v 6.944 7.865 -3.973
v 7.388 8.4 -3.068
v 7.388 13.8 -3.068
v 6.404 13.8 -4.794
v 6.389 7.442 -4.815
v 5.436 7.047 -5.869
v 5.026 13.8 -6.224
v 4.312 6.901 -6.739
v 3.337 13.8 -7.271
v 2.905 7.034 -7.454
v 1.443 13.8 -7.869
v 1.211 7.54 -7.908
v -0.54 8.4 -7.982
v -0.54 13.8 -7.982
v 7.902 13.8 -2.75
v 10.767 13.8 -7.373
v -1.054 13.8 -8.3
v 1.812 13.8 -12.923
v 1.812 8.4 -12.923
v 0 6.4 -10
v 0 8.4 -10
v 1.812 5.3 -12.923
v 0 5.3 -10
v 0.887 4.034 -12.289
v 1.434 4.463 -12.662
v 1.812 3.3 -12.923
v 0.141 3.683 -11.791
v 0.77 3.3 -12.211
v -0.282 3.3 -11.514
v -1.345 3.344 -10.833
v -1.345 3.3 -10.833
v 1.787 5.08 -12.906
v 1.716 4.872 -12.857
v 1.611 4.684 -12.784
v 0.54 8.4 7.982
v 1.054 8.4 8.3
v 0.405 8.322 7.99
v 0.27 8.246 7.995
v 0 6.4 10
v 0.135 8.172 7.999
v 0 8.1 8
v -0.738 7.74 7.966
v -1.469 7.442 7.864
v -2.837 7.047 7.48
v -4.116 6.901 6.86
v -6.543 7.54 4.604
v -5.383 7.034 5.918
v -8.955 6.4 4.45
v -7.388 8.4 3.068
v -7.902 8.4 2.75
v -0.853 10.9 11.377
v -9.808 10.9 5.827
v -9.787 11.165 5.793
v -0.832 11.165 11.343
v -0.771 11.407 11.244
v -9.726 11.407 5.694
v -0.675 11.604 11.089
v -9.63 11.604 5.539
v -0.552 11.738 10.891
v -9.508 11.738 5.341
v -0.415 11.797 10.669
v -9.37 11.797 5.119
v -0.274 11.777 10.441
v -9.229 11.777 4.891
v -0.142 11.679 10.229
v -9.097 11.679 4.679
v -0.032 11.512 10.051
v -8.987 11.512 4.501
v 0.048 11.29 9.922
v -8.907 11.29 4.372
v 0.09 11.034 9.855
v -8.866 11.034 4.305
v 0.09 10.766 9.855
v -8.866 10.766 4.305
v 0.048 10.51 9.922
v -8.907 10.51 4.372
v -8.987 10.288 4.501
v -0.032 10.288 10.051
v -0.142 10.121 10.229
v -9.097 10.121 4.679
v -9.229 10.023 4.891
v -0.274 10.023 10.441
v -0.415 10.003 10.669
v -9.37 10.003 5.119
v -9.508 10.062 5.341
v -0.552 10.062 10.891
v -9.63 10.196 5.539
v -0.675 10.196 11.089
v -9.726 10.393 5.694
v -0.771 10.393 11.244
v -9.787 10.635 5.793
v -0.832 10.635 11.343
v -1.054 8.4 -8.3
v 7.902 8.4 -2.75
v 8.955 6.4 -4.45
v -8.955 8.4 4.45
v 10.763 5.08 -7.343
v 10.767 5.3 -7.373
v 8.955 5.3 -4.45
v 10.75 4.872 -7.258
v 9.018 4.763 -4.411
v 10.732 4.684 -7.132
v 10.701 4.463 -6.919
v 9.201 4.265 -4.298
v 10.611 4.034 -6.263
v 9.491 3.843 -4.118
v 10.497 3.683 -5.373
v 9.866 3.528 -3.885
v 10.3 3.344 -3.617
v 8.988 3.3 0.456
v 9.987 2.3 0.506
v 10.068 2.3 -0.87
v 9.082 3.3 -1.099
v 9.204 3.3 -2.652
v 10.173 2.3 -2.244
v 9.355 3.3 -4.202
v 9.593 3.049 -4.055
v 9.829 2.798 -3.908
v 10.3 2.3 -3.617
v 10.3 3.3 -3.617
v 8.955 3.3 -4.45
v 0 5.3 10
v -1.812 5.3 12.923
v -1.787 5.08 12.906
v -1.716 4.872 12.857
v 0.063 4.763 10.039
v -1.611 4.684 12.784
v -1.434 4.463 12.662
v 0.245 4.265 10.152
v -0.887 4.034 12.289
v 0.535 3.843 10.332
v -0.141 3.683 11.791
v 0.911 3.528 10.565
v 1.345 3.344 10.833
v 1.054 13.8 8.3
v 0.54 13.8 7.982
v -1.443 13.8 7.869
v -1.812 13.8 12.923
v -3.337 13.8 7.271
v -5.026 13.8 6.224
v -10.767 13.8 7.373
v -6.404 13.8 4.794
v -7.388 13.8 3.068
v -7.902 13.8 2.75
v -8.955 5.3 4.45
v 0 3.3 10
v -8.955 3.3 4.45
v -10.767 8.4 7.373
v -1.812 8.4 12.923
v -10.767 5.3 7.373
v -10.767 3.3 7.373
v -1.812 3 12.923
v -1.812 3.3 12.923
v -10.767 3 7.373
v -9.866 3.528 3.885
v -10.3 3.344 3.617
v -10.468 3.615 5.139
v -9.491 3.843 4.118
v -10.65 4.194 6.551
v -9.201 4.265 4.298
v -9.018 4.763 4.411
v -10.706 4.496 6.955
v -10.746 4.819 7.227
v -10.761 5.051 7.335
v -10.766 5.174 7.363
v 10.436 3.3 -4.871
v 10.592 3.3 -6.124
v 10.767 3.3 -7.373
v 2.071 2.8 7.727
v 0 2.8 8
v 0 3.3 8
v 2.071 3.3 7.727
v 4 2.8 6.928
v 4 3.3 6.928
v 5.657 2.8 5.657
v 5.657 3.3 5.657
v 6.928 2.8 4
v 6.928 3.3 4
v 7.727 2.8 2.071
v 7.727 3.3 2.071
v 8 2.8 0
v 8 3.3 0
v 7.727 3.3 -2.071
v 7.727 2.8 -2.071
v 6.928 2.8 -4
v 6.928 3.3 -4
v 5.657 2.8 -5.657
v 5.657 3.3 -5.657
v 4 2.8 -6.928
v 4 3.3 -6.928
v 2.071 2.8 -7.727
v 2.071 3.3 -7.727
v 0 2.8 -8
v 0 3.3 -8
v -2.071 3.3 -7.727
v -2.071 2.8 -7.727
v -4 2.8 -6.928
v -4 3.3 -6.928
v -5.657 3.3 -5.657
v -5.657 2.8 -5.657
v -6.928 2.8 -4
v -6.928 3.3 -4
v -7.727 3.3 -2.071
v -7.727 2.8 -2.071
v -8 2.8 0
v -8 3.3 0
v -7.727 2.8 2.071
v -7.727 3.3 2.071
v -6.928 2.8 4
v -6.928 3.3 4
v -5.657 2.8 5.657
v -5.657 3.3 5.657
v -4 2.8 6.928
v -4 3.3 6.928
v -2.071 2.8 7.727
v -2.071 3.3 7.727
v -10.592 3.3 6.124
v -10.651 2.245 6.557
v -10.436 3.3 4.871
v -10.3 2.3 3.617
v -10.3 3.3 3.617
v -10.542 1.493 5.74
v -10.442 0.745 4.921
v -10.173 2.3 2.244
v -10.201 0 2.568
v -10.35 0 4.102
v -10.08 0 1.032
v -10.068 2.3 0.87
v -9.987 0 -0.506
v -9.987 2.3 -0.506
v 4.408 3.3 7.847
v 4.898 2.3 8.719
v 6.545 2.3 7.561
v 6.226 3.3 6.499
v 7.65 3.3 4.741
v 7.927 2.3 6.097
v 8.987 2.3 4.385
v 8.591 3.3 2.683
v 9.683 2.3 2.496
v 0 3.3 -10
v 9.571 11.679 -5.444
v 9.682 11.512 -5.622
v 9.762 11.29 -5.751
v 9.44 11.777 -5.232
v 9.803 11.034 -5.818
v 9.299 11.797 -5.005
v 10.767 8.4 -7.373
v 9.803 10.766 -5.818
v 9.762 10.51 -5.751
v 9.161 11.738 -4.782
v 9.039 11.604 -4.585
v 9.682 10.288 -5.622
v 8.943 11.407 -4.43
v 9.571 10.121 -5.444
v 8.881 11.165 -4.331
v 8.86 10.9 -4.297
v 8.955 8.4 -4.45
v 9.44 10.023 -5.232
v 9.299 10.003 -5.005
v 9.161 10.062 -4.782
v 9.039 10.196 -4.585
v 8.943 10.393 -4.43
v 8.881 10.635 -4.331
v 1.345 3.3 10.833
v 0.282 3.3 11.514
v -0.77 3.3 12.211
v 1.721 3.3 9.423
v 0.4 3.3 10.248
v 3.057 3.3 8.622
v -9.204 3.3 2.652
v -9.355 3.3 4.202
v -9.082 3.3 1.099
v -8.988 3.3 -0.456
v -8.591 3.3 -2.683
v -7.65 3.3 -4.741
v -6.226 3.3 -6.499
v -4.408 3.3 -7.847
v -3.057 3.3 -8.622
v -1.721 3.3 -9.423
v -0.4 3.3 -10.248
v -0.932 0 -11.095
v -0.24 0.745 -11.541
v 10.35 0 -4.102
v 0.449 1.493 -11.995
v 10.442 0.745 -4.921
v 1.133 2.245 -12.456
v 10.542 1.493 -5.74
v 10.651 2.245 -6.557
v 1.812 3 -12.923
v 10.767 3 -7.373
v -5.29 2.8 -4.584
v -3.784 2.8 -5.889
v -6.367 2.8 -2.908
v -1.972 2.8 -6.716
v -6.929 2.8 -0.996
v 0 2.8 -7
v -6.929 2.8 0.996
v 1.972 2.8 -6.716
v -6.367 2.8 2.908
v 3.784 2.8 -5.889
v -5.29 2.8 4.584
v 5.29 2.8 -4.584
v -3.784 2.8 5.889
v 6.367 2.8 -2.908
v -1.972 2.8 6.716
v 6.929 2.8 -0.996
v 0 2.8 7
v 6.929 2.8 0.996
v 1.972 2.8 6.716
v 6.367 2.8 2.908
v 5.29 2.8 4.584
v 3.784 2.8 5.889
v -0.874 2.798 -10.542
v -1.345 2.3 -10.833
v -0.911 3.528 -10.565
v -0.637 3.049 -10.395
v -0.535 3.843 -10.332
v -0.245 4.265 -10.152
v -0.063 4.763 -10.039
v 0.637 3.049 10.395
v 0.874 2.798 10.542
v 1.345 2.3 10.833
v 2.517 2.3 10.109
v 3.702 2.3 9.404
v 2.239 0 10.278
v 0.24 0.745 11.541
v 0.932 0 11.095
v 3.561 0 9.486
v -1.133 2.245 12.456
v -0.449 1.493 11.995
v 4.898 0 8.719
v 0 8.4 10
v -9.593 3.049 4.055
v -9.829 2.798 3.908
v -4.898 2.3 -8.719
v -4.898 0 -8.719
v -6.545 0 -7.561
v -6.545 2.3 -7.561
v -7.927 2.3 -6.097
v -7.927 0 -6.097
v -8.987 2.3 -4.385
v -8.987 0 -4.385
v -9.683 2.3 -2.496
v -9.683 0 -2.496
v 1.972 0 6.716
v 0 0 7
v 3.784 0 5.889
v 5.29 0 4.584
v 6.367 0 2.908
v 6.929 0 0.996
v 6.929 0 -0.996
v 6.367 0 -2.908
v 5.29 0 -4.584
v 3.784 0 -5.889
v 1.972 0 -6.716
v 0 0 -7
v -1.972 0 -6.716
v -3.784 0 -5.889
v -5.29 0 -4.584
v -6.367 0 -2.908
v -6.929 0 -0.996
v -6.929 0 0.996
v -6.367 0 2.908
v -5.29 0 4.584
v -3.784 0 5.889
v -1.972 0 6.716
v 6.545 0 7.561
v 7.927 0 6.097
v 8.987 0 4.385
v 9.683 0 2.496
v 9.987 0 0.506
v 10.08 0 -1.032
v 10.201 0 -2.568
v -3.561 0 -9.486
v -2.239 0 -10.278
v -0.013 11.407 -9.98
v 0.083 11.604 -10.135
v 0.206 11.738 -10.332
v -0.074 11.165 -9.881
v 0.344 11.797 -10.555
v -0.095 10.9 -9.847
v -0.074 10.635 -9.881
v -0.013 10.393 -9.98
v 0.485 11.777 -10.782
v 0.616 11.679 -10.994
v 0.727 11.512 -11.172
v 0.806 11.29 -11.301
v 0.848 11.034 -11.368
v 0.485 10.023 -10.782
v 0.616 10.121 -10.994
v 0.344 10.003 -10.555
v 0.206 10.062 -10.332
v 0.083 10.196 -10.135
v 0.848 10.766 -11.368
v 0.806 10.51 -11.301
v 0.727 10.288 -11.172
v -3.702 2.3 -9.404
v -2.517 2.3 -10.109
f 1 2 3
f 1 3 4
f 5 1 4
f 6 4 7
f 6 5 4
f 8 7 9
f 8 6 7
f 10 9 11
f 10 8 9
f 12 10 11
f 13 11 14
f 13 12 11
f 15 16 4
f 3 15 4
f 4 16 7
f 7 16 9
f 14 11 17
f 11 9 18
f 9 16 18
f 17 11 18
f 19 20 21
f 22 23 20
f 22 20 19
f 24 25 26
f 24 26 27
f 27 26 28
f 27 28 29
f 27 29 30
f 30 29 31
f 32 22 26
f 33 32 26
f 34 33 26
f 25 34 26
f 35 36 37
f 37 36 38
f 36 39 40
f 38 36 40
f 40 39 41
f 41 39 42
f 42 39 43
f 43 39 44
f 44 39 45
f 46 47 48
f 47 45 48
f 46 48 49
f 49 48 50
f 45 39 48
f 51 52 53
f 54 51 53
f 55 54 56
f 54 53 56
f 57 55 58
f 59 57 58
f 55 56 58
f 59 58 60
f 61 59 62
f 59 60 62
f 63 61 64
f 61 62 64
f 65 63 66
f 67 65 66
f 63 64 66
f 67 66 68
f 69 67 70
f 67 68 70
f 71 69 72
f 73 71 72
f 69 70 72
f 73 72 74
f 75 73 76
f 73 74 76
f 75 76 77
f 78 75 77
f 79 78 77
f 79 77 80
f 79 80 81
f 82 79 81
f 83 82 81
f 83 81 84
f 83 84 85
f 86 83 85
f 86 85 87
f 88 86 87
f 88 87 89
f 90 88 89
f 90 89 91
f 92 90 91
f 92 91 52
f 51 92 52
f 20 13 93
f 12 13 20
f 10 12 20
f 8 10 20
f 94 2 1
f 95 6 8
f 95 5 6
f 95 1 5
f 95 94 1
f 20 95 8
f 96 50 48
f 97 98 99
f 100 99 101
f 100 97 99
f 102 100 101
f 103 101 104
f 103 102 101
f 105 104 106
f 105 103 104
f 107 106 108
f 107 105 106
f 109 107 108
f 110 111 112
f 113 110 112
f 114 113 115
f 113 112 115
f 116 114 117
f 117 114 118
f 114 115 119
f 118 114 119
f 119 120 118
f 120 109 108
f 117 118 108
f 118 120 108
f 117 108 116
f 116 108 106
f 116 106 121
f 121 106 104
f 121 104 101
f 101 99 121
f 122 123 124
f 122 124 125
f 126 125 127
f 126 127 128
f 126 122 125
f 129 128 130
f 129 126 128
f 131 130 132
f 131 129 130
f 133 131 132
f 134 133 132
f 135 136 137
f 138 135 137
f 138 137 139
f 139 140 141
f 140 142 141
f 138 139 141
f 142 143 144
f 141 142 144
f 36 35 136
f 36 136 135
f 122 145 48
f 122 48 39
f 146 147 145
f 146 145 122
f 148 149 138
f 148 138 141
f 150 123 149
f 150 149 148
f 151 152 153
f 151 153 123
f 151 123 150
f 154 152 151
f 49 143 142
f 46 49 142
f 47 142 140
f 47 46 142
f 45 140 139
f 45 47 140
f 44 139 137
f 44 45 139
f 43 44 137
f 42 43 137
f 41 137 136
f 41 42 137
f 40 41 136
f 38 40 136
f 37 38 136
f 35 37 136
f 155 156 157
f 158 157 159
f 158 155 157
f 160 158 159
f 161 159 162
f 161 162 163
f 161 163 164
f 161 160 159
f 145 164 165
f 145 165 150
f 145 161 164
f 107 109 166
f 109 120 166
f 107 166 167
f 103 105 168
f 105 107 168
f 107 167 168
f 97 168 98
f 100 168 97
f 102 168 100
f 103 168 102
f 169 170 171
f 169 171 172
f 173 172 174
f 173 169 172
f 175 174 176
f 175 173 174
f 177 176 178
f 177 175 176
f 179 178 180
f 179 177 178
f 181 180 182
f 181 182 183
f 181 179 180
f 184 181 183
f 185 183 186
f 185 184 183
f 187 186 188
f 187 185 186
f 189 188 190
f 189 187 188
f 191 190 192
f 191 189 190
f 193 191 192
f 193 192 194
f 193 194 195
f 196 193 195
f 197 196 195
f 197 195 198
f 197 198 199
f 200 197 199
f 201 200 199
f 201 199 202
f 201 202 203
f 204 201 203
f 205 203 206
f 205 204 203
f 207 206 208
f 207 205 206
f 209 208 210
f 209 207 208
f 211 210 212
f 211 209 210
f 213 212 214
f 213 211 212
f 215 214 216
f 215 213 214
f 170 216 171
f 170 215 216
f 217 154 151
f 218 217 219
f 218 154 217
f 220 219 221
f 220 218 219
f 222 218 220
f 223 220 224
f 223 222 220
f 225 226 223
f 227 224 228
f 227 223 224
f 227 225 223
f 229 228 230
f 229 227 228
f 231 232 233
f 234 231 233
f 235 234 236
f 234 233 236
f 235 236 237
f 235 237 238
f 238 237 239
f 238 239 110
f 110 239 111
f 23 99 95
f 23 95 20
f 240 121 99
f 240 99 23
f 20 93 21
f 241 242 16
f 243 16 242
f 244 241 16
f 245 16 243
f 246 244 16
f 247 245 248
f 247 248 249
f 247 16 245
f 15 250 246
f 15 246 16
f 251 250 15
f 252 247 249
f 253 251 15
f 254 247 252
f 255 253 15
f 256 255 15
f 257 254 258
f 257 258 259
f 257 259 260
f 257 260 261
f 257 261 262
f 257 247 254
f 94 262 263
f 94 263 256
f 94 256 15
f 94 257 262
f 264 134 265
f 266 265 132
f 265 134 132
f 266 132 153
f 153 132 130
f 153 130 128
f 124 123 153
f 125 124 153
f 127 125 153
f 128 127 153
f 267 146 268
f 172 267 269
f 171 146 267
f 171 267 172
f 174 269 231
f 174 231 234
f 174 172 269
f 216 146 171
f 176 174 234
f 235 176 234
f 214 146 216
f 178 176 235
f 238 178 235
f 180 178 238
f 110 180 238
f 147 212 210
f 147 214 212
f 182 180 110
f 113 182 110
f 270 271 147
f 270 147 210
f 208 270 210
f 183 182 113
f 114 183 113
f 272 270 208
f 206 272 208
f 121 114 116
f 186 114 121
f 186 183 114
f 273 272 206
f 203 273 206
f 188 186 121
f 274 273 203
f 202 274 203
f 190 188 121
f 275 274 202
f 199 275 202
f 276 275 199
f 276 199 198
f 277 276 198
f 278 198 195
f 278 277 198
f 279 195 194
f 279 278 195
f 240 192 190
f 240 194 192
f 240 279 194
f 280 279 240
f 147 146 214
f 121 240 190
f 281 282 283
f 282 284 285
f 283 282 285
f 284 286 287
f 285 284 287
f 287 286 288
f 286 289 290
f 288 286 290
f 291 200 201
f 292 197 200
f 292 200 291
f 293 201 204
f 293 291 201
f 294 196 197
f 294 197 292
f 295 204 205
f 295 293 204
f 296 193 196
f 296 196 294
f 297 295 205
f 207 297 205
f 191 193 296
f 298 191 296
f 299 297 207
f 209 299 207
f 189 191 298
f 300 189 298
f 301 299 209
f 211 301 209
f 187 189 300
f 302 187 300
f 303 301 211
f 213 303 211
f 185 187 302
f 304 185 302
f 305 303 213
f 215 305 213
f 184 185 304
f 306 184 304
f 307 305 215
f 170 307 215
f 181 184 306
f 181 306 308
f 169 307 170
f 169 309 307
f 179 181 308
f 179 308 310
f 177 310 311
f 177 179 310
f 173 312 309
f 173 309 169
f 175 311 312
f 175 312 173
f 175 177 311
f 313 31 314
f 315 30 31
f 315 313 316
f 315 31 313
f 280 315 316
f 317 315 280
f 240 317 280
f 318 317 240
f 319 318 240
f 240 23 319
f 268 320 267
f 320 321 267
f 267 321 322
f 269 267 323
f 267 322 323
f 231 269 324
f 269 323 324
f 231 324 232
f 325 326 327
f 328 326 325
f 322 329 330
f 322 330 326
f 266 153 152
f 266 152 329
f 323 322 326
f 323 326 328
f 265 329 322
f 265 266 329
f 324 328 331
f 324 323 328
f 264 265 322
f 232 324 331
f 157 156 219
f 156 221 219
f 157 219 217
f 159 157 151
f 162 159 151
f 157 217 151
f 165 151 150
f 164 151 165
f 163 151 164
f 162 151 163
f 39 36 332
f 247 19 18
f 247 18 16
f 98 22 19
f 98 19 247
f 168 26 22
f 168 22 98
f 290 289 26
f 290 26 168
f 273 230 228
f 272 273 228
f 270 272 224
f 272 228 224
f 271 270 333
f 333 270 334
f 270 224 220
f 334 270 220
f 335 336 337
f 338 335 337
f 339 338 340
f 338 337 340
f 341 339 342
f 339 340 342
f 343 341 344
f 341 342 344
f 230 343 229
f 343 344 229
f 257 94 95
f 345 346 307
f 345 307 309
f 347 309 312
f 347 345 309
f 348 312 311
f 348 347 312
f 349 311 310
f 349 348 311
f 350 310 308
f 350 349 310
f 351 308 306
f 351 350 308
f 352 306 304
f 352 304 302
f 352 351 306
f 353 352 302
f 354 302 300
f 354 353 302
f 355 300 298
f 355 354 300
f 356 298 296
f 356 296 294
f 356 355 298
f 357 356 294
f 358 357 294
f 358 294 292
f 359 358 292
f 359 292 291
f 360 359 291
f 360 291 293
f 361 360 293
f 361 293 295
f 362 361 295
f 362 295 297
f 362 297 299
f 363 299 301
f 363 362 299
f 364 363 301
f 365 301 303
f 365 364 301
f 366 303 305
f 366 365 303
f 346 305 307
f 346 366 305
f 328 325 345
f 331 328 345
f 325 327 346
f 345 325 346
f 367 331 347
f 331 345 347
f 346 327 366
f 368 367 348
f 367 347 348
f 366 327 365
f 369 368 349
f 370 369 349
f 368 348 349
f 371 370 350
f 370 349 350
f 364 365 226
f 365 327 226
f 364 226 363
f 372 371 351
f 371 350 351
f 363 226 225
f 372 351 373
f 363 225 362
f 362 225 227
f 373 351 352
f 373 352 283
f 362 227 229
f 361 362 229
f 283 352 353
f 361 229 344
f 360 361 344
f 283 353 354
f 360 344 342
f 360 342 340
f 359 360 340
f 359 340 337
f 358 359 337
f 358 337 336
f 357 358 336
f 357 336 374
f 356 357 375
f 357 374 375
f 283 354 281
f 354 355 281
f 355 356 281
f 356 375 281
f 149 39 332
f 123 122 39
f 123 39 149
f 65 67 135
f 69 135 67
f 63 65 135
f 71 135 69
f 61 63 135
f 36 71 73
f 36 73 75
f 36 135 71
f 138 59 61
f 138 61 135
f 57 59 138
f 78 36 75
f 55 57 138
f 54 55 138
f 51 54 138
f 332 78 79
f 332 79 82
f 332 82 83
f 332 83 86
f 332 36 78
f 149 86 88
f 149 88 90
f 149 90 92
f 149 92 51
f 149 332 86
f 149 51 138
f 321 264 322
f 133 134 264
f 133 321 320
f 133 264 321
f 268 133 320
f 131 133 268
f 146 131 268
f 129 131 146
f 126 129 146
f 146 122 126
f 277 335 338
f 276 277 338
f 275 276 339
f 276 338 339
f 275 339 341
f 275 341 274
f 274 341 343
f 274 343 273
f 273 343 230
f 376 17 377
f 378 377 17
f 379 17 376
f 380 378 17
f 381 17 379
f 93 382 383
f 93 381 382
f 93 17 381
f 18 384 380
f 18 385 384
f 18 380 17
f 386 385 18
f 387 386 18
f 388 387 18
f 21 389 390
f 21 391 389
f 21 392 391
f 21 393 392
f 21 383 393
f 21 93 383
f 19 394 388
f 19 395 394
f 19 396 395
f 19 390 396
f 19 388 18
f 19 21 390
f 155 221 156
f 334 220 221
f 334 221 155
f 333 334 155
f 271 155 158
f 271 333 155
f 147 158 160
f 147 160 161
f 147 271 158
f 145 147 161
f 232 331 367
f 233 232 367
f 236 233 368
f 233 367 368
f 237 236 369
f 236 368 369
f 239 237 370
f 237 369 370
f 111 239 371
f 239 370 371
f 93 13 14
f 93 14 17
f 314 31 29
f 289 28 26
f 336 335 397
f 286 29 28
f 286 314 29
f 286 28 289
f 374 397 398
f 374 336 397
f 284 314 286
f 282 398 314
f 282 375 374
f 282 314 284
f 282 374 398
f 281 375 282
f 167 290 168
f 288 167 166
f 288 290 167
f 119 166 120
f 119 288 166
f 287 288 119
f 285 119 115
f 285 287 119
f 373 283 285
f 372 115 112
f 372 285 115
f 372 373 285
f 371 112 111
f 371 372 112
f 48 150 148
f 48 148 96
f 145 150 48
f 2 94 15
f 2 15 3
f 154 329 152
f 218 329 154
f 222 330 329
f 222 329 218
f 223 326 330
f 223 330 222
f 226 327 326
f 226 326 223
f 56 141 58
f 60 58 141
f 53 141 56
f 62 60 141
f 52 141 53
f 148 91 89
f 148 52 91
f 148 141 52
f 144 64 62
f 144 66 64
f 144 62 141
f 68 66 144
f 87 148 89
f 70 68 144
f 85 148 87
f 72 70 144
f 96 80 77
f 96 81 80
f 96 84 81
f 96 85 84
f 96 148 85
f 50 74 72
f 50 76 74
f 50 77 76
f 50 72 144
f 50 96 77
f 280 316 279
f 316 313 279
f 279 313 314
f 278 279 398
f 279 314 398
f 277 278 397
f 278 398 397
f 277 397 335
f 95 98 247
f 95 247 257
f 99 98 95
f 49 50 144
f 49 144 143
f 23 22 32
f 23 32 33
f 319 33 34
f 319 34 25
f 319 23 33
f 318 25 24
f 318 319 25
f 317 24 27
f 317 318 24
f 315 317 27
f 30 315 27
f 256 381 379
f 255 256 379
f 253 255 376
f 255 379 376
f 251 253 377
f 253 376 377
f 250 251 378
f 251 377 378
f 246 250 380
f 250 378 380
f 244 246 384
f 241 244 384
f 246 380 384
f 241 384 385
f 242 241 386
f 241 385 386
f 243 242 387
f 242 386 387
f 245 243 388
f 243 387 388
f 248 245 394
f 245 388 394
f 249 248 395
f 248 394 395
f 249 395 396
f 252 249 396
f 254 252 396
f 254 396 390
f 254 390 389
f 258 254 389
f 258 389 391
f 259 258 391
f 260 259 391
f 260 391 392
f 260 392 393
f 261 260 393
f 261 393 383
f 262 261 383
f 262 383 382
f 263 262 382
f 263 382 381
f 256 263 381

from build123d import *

# Parameters (mm, degrees)
SKETCH_1_R          = 10
SKETCH_1_R_2        = 7
EXTRUDE_1_DEPTH     = 2.8
SKETCH_2_R          = 10
SKETCH_2_R_2        = 8
EXTRUDE_2_DEPTH     = 0.5
EXTRUDE_3_DEPTH     = 8.4
EXTRUDE_4_DEPTH     = 5.4
SKETCH_7_R          = 0.9
CUT_EXTRUDE_1_DEPTH = 26.870410541
CHAMFER_2_SIZE      = 2
EXTRUDE_5_REACH     = 23.757
FILLET_2_R          = 82.5
CHAMFER_4_SIZE      = 3
FILLET_3_R          = 2
CUT_EXTRUDE_START   = -7
SKETCH_9_R          = 8
CUT_EXTRUDE_2_DEPTH = 7
CHAMFER_5_SIZE      = 1


with BuildPart() as part:
    # 草图1 → 凸台-拉伸1 (new body)
    with BuildSketch(Plane(origin=(0, 0, 0), x_dir=(1, 0, 0), z_dir=(0, 1, 0))):
        with Locations(Location((0, 0, 0), (0, 0, 270))):
            Circle(SKETCH_1_R)
        with Locations(Location((0, 0, 0), (0, 0, 270))):
            Circle(SKETCH_1_R_2, mode=Mode.SUBTRACT)
    extrude(amount=EXTRUDE_1_DEPTH)

    # 草图2 → 凸台-拉伸2 (add)
    with BuildSketch(Plane(origin=(0, 2.8, 0), x_dir=(1, 0, 0), z_dir=(0, 1, 0))):
        with Locations(Location((0, 0, 0), (0, 0, 270))):
            Circle(SKETCH_2_R)
        with Locations(Location((0, 0, 0), (0, 0, 270))):
            Circle(SKETCH_2_R_2, mode=Mode.SUBTRACT)
    extrude(amount=EXTRUDE_2_DEPTH)

    # 草图3 → 凸台-拉伸3 (add)
    with BuildSketch(Plane.XZ):
        with BuildLine():
            ThreePointArc((0, 10), (-5.267826876, 8.5), (-8.95530569, 4.45))
            Line((-8.95530569, 4.45), (0, 10))
        make_face()
        with BuildLine():
            Line((8.95530569, -4.45), (0, -10))
            ThreePointArc((0, -10), (5.267826876, -8.5), (8.95530569, -4.45))
        make_face()
    extrude(amount=-EXTRUDE_3_DEPTH)

    # 草图5 → 凸台-拉伸4 (add)
    with BuildSketch(Plane(origin=(0, 8.4, 0), x_dir=(1, 0, 0), z_dir=(0, 1, 0))):
        Polygon((1.811722614, 12.923338709), (10.767028304, 7.373338709), (7.901740315, 2.75), (-1.053565375, 8.3), align=None)
        Polygon((-7.901740315, -2.75), (1.053565375, -8.3), (-1.811722614, -12.923338709), (-10.767028304, -7.373338709), align=None)
    extrude(amount=EXTRUDE_4_DEPTH)

    # 草图7 → 切除-拉伸1 (cut, through all)
    with BuildSketch(Plane(origin=(-4.477652845, 0, -2.775), x_dir=(-0.5267826876426366, 0, 0.8500000000000003), z_dir=(-0.8500000000000003, 0, -0.5267826876426366))):
        with Locations((9.219611005, 10.9)):
            Circle(SKETCH_7_R)
        with Locations((-9.219611005, 10.9)):
            Circle(SKETCH_7_R)
    extrude(amount=-CUT_EXTRUDE_1_DEPTH, mode=Mode.SUBTRACT)

    # 倒角2
    # the kernel refuses this chamfer: 2 mm, written as the material it adds along each edge
    with BuildSketch(Plane(origin=(-8.95530569, 8.4, 4.45), x_dir=(0, -1, 0), z_dir=(0.8500000000000002, 0, 0.5267826876426367))) as chamfer_2_piece_1_section:
        Polygon((CHAMFER_2_SIZE, 0), (0, CHAMFER_2_SIZE), (0, 0), align=None)
    chamfer_2_piece_1 = extrude(amount=10.535653753, mode=Mode.PRIVATE)
    chamfer_2_piece_1 = chamfer_2_piece_1 & Plane(origin=(0, 8.4, 0), x_dir=(0, 0, 1), z_dir=(0, -1, 0)) * Cylinder(10, 30, mode=Mode.PRIVATE)
    chamfer_2_piece_1 = split(chamfer_2_piece_1, bisect_by=Plane(origin=(-7.901740315, 8.4, 2.75), z_dir=(-0.5267826876426371, 0, 0.85)), keep=Keep.TOP, mode=Mode.PRIVATE)
    add(chamfer_2_piece_1)
    with BuildSketch(Plane(origin=(8.95530569, 8.4, -4.45), x_dir=(-0.5267826876426367, 0, 0.8500000000000002), z_dir=(-0.8500000000000002, 0, -0.5267826876426367))) as chamfer_2_piece_2_section:
        Polygon((CHAMFER_2_SIZE, 0), (0, -CHAMFER_2_SIZE), (0, 0), align=None)
    chamfer_2_piece_2 = extrude(amount=10.535653753, mode=Mode.PRIVATE)
    chamfer_2_piece_2 = chamfer_2_piece_2 & Plane(origin=(0, 8.4, 0), x_dir=(0, 0, -1), z_dir=(0, -1, 0)) * Cylinder(10, 30, mode=Mode.PRIVATE)
    chamfer_2_piece_2 = split(chamfer_2_piece_2, bisect_by=Plane(origin=(7.901740315, 8.4, -2.75), z_dir=(0.5267826876426374, 0, -0.8499999999999999)), keep=Keep.TOP, mode=Mode.PRIVATE)
    add(chamfer_2_piece_2)

    # 草图8 → 凸台-拉伸5 (add, up to next)
    with BuildSketch(Plane.XZ, mode=Mode.PRIVATE) as extrude_5_sk1:
        with BuildLine():
            Line((10.767028304, -7.373338709), (8.95530569, -4.45))
            ThreePointArc((8.95530569, -4.45), (5.267826876, -8.5), (0, -10))
            Line((0, -10), (1.811722614, -12.923338709))
            Line((1.811722614, -12.923338709), (10.767028304, -7.373338709))
        make_face()
    extrude_5_tool1 = extrude(extrude_5_sk1.sketch, amount=-EXTRUDE_5_REACH, mode=Mode.PRIVATE) - part.part
    # 草图8 → 凸台-拉伸5 (add, up to next)
    with BuildSketch(Plane.XZ, mode=Mode.PRIVATE) as extrude_5_sk2:
        with BuildLine():
            Line((-10.767028304, 7.373338709), (-8.95530569, 4.45))
            ThreePointArc((-8.95530569, 4.45), (-5.267826876, 8.5), (0, 10))
            Line((0, 10), (-1.811722614, 12.923338709))
            Line((-1.811722614, 12.923338709), (-10.767028304, 7.373338709))
        make_face()
    extrude_5_tool2 = extrude(extrude_5_sk2.sketch, amount=-EXTRUDE_5_REACH, mode=Mode.PRIVATE) - part.part
    add(extrude_5_tool1.solids().sort_by_distance((5.629921, 0, -9.084263))[0])
    add(extrude_5_tool2.solids().sort_by_distance((-5.629921, 0, 9.084263))[0])

    # 圆角2
    # the kernel refuses this fillet: 82.5 mm, written as the material it adds along each edge
    with BuildSketch(Plane(origin=(0, 0, -10), x_dir=(0.526782687642631, 0, -0.8500000000000036), z_dir=(0, 1, 0))) as fillet_2_piece_1:
        with BuildLine():
            CenterArc((36.184795451, 75.723030975), FILLET_2_R, 241.113318321, 5.501155307)
            ThreePointArc((-3.669211303, 3.48794154), (-1.610231073, 1.980006188), (0, 0))
            Line((0, 0), (3.43922201, 0))
        make_face()
    extrude(amount=3.3)
    with BuildSketch(Plane(origin=(8.95530569, 0, -4.45), x_dir=(0.203827060688438, 0, 0.9790069097463571), z_dir=(0, 1, 0))) as fillet_2_piece_2:
        with BuildLine():
            CenterArc((25.945282898, 79.813276697), FILLET_2_R, 249.836350841, 5.501155307)
            Line((-2.4926907, 2.369544494), (0, 0))
            ThreePointArc((0, 0), (2.531247112, 0.325663431), (5.062494224, 0))
        make_face()
    extrude(amount=3.3)
    with BuildSketch(Plane(origin=(0, 3.3, 10), x_dir=(-0.5267826876443492, 0, 0.8499999999989388), z_dir=(0, -1, 0)), Plane(origin=(-8.95530569, 0, 4.45), x_dir=(-0.5267826876426422, 0, 0.8499999999999966), z_dir=(0, 1, 0))) as fillet_2_piece_3:
        with BuildLine():
            CenterArc((36.184795451, -75.723030975), FILLET_2_R, 113.385526372, 5.501155307)
            ThreePointArc((-3.669211303, -3.48794154), (-1.610231073, -1.980006188), (0, 0))
            Line((0, 0), (3.43922201, 0))
        make_face()
    extrude(amount=3.3)

    # 倒角4
    chamfer_4_edges = [part.edges().sort_by_distance(p)[0] for p in [
        (6.289375459, 0, -10.148338709),
        (-6.289375459, 0, 10.148338709),
    ]]
    chamfer(chamfer_4_edges, length=CHAMFER_4_SIZE)

    # 圆角3
    # the kernel refuses this fillet: 2 mm, written as the material it adds along each edge
    with BuildSketch(Plane(origin=(0, 3.3, -10), x_dir=(-0.8499999999998374, 0, -0.5267826876428993), z_dir=(0.5267826876428993, 0, -0.8499999999998374))) as fillet_3_piece_1_section:
        with BuildLine():
            CenterArc((FILLET_3_R, FILLET_3_R), FILLET_3_R, 180, 90)
            Line((0, FILLET_3_R), (0, 0))
            Line((0, 0), (FILLET_3_R, 0))
        make_face()
    fillet_3_piece_1 = extrude(amount=3.43922201, mode=Mode.PRIVATE)
    fillet_3_piece_1 = fillet_3_piece_1 - Plane(origin=(-45.303052529, 3.3, -80.646657907), x_dir=(0.5267826876428993, 0, -0.8499999999998374), z_dir=(0, -1, 0)) * Cylinder(82.5, 15, mode=Mode.PRIVATE)
    add(fillet_3_piece_1)
    with BuildSketch(Plane(origin=(-8.95530569, 3.3, 4.45), x_dir=(-0.8499999999998374, 0, -0.5267826876428994), z_dir=(-0.5267826876428993, 0, 0.8499999999998374))) as fillet_3_piece_2_section:
        with BuildLine():
            CenterArc((FILLET_3_R, -FILLET_3_R), FILLET_3_R, 90, 90)
            Line((0, -FILLET_3_R), (0, 0))
            Line((0, 0), (FILLET_3_R, 0))
        make_face()
    fillet_3_piece_2 = extrude(amount=3.43922201, mode=Mode.PRIVATE)
    fillet_3_piece_2 = fillet_3_piece_2 - Plane(origin=(-92.381405818, 3.3, -4.682505639), x_dir=(-0.5267826876428993, 0, 0.8499999999998374), z_dir=(0, -1, 0)) * Cylinder(82.5, 15, mode=Mode.PRIVATE)
    add(fillet_3_piece_2)
    with BuildSketch(Plane(origin=(10.767028304, 3.3, -7.373338709), x_dir=(0.8499999999997903, 0, 0.5267826876429756), z_dir=(-0.5267826876429755, 0, 0.8499999999997901))) as fillet_3_piece_3_section:
        with BuildLine():
            CenterArc((FILLET_3_R, FILLET_3_R), FILLET_3_R, 180, 90)
            Line((0, FILLET_3_R), (0, 0))
            Line((0, 0), (FILLET_3_R, 0))
        make_face()
    fillet_3_piece_3 = extrude(amount=3.43922201, mode=Mode.PRIVATE)
    fillet_3_piece_3 = fillet_3_piece_3 - Plane(origin=(92.381405818, 3.3, 4.68250564), x_dir=(0.20382706068808945, 0, 0.9790069097464297), z_dir=(0, -1, 0)) * Cylinder(82.5, 15, mode=Mode.PRIVATE)
    add(fillet_3_piece_3)
    with BuildSketch(Plane(origin=(0, 3.3, 10), x_dir=(0.8499999999991121, 0, 0.5267826876440694), z_dir=(-0.5267826876440695, 0, 0.8499999999991122))) as fillet_3_piece_4_section:
        with BuildLine():
            CenterArc((FILLET_3_R, FILLET_3_R), FILLET_3_R, 180, 90)
            Line((0, FILLET_3_R), (0, 0))
            Line((0, 0), (FILLET_3_R, 0))
        make_face()
    fillet_3_piece_4 = extrude(amount=3.43922201, mode=Mode.PRIVATE)
    fillet_3_piece_4 = fillet_3_piece_4 - Plane(origin=(45.303052529, 3.3, 80.646657907), x_dir=(-0.5267826876440695, 0, 0.8499999999991122), z_dir=(0, 1, 0)) * Cylinder(82.5, 15, mode=Mode.PRIVATE)
    add(fillet_3_piece_4)

    # 草图9 → 切除-拉伸2 (cut)
    with BuildSketch(Plane(origin=(0, 13.8, 0), x_dir=(1, 0, 0), z_dir=(0, 1, 0)).offset(CUT_EXTRUDE_START)):
        with Locations(Location((0, 0, 0), (0, 0, 270))):
            Circle(SKETCH_9_R)
    extrude(amount=CUT_EXTRUDE_2_DEPTH, mode=Mode.SUBTRACT)

    # 倒角5
    chamfer_5_edges = [part.edges().sort_by_distance(p)[0] for p in [
        (-8.5, 3.3, -5.267826876),
        (8.5, 3.3, 5.267826876),
        (-10.117707279, 3.3, 1.557198087),
        (10.117707279, 3.3, -1.557198087),
        (3.10786125, 3.3, 9.753669305),
        (-3.10786125, 3.3, -9.753669305),
    ]]
    chamfer(chamfer_5_edges, length=CHAMFER_5_SIZE)


solid = part.part
